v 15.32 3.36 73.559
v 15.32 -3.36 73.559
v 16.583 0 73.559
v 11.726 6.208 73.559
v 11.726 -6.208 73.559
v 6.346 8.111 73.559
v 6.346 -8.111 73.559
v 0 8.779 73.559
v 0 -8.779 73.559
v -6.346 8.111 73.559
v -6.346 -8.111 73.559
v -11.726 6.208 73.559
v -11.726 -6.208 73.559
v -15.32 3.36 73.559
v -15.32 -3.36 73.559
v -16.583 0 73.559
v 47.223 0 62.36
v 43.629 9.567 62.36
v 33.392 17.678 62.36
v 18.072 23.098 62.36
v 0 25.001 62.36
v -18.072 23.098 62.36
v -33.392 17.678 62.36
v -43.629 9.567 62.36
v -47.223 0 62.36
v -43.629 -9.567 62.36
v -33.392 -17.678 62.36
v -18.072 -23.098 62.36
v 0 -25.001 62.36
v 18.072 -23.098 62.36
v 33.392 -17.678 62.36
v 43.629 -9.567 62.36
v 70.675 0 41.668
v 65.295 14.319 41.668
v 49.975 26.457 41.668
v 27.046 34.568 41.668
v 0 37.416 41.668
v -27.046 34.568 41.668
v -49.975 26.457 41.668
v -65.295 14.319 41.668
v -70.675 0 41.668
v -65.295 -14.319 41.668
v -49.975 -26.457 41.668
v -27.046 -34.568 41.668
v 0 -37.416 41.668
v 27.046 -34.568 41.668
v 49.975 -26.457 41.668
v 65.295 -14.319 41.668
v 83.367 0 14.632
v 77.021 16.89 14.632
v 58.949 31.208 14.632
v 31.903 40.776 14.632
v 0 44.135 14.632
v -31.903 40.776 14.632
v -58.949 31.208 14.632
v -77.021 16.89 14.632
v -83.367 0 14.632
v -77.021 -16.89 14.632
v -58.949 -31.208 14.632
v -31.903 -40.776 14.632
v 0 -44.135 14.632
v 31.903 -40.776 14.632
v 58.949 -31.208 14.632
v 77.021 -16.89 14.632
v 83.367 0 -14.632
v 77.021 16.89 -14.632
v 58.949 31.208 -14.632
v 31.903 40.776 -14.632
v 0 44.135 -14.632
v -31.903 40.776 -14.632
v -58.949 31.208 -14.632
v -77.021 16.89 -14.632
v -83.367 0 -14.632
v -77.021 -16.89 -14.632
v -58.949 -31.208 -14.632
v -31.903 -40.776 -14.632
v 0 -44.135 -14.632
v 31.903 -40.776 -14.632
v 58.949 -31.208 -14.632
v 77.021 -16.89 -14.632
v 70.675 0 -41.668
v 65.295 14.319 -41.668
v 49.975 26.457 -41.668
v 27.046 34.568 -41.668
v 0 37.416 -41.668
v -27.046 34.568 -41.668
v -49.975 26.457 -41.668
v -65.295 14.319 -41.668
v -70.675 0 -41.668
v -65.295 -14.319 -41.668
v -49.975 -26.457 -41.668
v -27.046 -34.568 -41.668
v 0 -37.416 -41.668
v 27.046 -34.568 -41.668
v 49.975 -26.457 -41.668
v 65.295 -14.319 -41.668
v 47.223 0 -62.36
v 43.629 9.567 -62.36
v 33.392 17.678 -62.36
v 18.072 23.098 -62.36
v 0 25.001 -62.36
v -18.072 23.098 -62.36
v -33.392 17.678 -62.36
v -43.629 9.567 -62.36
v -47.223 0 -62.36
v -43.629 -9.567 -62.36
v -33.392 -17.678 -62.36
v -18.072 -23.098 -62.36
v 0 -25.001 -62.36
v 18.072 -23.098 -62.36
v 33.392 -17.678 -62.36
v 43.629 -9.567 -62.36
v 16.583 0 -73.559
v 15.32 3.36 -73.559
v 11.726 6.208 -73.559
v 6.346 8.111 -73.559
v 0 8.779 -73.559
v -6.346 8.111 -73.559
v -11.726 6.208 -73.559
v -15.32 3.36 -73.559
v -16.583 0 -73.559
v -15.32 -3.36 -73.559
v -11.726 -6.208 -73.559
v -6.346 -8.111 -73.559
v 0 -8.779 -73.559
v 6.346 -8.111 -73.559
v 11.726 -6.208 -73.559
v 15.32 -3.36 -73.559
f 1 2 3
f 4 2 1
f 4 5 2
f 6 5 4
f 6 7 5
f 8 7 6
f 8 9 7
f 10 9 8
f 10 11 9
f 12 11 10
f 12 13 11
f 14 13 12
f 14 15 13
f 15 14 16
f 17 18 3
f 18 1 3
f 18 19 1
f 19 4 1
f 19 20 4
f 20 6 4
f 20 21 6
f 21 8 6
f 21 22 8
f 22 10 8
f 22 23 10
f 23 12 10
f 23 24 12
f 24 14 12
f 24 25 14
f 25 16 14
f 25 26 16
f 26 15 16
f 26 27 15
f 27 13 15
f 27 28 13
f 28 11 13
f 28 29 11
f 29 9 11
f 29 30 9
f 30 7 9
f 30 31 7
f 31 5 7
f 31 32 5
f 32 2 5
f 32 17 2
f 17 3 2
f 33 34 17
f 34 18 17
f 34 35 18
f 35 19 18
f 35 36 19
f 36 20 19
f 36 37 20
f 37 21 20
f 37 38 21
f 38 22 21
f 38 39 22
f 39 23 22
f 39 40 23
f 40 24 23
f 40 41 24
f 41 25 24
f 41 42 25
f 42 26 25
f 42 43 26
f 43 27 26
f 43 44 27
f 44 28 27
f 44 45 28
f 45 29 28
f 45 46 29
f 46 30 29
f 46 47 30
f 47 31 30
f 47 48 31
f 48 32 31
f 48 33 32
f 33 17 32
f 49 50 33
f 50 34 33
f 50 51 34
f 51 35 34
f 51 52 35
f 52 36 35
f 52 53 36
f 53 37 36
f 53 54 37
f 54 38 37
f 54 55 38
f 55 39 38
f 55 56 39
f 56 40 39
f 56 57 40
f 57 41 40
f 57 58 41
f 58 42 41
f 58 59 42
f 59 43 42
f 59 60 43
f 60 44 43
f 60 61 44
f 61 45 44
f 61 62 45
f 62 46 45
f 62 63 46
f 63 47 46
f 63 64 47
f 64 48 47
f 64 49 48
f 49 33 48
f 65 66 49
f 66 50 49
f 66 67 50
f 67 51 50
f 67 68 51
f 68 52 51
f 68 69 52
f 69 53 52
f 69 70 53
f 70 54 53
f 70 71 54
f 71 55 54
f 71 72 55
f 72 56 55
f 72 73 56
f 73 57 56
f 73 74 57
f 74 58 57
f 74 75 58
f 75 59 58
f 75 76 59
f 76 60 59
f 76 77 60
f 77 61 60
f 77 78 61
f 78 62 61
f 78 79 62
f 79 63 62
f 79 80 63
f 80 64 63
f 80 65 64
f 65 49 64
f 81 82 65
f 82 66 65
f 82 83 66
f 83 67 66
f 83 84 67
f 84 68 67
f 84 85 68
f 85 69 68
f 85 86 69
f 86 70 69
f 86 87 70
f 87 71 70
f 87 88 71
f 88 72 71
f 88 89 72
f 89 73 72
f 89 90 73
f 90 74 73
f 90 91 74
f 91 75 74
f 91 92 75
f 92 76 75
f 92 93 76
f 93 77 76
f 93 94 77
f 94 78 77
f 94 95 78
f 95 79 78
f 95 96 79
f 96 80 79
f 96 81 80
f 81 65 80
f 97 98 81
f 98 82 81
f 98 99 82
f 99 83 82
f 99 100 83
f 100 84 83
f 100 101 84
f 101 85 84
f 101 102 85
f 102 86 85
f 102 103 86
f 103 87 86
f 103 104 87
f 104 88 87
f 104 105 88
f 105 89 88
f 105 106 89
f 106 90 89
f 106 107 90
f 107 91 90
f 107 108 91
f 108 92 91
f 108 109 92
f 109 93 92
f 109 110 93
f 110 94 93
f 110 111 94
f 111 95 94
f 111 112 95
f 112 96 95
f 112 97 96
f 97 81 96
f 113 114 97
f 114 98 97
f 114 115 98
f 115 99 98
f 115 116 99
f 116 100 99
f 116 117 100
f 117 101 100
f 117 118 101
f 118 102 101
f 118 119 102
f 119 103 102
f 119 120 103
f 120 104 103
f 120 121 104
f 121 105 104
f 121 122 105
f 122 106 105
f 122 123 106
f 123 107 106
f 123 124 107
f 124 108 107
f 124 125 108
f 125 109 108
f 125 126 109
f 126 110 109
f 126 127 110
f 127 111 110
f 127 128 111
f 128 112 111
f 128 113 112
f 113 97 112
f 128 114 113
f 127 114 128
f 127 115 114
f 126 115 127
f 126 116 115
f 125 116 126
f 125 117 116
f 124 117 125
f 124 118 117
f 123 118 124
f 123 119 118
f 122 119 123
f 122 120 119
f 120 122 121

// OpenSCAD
// Generated by SolidPython 1.0.1 on 2020-07-29 00:46:53


scale(v = [17, 9, 15]) {
	sphere(r = 5);
}
/***********************************************
*********      SolidPython code:      **********
************************************************
 
# import packages: SolidPython
from solid import *
from solid.utils import *
from itertools import chain, combinations, permutations


class Resize:

    def __init__(self, scad_file):
        self.scad_file = scad_file
        #self.scad_file = import_scad(scad_file)
        # cone/cylinder param:
        self.r1 = 0
        self.r2 = 0
        self.h = 0
        # rectangular prism param:
        self.w = 0
        self.l = 0
        # ellipse param:
        self.r = 0

    # import OpenScad code (file name corresponds to shape)


    # classify shape + parameters
    def assign(self, param1, param2, param3):
        if self.scad_file == 'cone.scad':
            self.r1 = param1
            self.r2 = param2
            self.h = param3
        elif self.scad_file == 'cylinder.scad':
            self.r1 = param1
            self.r2 = param2
            self.h = param3
        elif self.scad_file == 'rectangularPrism.scad':
            self.h = param1
            self.l = param2
            self.w = param3
        else:
            self.r = param1
            self.h = param2

    # resize parameters
    def iterate(self):
        x = range(3, 20, 2)
        i = 1
        if self.scad_file == 'cone.scad':
            tempList = list(permutations(x, 2))
            for temp in tempList:
                param1 = temp[0]
                param2 = temp[1]
                filepath = 'produced_scad_files/' + 'cone' + str(param1) + '_' + str(param2) + '_' + '.scad'
                scad_render_to_file(cylinder(h=param1, r1=param2, r2=0), filepath)

        elif self.scad_file == 'cylinder.scad':
            tempList = list(permutations(x, 3))
            for temp in tempList:
                param1 = temp[0]
                param2 = temp[1]
                filepath = 'produced_scad_files/' + 'cylinder' + str(param1) + '_' + str(param2) + '_' + '.scad'
                scad_render_to_file(cylinder(h=param1, r1=param2, r2=param2), filepath)

        elif self.scad_file == 'rectangularPrism.scad':
            tempList = list(permutations(x, 3))
            for temp in tempList:
                param1 = temp[0]
                param2 = temp[1]
                param3 = temp[2]
                filepath = 'produced_scad_files/' + 'rectangularPrism' + str(param1) + '_' + str(param2) + '_' + str(
                    param3) + '.scad'
                scad_render_to_file(cube(size=(param1, param2, param3)), filepath)

        elif self.scad_file == 'ellipse.scad':
            tempList = list(permutations(x, 4))
            for temp in tempList:
                param1 = temp[0]
                param2 = temp[1]
                param3 = temp[2]
                param4 = temp[3]
                filepath = 'produced_scad_files/' + 'ellipse' + str(param1) + '_' + str(param2) + '_' + str(param3) + '_' + str(param4) + '.scad'
                scad_render_to_file(scale([param1, param2, param3])(sphere(r=param4)), filepath)

    def render_to_scadfile(self):
        scad_render_to_file(scad, 'example.scad') 
 
************************************************/
